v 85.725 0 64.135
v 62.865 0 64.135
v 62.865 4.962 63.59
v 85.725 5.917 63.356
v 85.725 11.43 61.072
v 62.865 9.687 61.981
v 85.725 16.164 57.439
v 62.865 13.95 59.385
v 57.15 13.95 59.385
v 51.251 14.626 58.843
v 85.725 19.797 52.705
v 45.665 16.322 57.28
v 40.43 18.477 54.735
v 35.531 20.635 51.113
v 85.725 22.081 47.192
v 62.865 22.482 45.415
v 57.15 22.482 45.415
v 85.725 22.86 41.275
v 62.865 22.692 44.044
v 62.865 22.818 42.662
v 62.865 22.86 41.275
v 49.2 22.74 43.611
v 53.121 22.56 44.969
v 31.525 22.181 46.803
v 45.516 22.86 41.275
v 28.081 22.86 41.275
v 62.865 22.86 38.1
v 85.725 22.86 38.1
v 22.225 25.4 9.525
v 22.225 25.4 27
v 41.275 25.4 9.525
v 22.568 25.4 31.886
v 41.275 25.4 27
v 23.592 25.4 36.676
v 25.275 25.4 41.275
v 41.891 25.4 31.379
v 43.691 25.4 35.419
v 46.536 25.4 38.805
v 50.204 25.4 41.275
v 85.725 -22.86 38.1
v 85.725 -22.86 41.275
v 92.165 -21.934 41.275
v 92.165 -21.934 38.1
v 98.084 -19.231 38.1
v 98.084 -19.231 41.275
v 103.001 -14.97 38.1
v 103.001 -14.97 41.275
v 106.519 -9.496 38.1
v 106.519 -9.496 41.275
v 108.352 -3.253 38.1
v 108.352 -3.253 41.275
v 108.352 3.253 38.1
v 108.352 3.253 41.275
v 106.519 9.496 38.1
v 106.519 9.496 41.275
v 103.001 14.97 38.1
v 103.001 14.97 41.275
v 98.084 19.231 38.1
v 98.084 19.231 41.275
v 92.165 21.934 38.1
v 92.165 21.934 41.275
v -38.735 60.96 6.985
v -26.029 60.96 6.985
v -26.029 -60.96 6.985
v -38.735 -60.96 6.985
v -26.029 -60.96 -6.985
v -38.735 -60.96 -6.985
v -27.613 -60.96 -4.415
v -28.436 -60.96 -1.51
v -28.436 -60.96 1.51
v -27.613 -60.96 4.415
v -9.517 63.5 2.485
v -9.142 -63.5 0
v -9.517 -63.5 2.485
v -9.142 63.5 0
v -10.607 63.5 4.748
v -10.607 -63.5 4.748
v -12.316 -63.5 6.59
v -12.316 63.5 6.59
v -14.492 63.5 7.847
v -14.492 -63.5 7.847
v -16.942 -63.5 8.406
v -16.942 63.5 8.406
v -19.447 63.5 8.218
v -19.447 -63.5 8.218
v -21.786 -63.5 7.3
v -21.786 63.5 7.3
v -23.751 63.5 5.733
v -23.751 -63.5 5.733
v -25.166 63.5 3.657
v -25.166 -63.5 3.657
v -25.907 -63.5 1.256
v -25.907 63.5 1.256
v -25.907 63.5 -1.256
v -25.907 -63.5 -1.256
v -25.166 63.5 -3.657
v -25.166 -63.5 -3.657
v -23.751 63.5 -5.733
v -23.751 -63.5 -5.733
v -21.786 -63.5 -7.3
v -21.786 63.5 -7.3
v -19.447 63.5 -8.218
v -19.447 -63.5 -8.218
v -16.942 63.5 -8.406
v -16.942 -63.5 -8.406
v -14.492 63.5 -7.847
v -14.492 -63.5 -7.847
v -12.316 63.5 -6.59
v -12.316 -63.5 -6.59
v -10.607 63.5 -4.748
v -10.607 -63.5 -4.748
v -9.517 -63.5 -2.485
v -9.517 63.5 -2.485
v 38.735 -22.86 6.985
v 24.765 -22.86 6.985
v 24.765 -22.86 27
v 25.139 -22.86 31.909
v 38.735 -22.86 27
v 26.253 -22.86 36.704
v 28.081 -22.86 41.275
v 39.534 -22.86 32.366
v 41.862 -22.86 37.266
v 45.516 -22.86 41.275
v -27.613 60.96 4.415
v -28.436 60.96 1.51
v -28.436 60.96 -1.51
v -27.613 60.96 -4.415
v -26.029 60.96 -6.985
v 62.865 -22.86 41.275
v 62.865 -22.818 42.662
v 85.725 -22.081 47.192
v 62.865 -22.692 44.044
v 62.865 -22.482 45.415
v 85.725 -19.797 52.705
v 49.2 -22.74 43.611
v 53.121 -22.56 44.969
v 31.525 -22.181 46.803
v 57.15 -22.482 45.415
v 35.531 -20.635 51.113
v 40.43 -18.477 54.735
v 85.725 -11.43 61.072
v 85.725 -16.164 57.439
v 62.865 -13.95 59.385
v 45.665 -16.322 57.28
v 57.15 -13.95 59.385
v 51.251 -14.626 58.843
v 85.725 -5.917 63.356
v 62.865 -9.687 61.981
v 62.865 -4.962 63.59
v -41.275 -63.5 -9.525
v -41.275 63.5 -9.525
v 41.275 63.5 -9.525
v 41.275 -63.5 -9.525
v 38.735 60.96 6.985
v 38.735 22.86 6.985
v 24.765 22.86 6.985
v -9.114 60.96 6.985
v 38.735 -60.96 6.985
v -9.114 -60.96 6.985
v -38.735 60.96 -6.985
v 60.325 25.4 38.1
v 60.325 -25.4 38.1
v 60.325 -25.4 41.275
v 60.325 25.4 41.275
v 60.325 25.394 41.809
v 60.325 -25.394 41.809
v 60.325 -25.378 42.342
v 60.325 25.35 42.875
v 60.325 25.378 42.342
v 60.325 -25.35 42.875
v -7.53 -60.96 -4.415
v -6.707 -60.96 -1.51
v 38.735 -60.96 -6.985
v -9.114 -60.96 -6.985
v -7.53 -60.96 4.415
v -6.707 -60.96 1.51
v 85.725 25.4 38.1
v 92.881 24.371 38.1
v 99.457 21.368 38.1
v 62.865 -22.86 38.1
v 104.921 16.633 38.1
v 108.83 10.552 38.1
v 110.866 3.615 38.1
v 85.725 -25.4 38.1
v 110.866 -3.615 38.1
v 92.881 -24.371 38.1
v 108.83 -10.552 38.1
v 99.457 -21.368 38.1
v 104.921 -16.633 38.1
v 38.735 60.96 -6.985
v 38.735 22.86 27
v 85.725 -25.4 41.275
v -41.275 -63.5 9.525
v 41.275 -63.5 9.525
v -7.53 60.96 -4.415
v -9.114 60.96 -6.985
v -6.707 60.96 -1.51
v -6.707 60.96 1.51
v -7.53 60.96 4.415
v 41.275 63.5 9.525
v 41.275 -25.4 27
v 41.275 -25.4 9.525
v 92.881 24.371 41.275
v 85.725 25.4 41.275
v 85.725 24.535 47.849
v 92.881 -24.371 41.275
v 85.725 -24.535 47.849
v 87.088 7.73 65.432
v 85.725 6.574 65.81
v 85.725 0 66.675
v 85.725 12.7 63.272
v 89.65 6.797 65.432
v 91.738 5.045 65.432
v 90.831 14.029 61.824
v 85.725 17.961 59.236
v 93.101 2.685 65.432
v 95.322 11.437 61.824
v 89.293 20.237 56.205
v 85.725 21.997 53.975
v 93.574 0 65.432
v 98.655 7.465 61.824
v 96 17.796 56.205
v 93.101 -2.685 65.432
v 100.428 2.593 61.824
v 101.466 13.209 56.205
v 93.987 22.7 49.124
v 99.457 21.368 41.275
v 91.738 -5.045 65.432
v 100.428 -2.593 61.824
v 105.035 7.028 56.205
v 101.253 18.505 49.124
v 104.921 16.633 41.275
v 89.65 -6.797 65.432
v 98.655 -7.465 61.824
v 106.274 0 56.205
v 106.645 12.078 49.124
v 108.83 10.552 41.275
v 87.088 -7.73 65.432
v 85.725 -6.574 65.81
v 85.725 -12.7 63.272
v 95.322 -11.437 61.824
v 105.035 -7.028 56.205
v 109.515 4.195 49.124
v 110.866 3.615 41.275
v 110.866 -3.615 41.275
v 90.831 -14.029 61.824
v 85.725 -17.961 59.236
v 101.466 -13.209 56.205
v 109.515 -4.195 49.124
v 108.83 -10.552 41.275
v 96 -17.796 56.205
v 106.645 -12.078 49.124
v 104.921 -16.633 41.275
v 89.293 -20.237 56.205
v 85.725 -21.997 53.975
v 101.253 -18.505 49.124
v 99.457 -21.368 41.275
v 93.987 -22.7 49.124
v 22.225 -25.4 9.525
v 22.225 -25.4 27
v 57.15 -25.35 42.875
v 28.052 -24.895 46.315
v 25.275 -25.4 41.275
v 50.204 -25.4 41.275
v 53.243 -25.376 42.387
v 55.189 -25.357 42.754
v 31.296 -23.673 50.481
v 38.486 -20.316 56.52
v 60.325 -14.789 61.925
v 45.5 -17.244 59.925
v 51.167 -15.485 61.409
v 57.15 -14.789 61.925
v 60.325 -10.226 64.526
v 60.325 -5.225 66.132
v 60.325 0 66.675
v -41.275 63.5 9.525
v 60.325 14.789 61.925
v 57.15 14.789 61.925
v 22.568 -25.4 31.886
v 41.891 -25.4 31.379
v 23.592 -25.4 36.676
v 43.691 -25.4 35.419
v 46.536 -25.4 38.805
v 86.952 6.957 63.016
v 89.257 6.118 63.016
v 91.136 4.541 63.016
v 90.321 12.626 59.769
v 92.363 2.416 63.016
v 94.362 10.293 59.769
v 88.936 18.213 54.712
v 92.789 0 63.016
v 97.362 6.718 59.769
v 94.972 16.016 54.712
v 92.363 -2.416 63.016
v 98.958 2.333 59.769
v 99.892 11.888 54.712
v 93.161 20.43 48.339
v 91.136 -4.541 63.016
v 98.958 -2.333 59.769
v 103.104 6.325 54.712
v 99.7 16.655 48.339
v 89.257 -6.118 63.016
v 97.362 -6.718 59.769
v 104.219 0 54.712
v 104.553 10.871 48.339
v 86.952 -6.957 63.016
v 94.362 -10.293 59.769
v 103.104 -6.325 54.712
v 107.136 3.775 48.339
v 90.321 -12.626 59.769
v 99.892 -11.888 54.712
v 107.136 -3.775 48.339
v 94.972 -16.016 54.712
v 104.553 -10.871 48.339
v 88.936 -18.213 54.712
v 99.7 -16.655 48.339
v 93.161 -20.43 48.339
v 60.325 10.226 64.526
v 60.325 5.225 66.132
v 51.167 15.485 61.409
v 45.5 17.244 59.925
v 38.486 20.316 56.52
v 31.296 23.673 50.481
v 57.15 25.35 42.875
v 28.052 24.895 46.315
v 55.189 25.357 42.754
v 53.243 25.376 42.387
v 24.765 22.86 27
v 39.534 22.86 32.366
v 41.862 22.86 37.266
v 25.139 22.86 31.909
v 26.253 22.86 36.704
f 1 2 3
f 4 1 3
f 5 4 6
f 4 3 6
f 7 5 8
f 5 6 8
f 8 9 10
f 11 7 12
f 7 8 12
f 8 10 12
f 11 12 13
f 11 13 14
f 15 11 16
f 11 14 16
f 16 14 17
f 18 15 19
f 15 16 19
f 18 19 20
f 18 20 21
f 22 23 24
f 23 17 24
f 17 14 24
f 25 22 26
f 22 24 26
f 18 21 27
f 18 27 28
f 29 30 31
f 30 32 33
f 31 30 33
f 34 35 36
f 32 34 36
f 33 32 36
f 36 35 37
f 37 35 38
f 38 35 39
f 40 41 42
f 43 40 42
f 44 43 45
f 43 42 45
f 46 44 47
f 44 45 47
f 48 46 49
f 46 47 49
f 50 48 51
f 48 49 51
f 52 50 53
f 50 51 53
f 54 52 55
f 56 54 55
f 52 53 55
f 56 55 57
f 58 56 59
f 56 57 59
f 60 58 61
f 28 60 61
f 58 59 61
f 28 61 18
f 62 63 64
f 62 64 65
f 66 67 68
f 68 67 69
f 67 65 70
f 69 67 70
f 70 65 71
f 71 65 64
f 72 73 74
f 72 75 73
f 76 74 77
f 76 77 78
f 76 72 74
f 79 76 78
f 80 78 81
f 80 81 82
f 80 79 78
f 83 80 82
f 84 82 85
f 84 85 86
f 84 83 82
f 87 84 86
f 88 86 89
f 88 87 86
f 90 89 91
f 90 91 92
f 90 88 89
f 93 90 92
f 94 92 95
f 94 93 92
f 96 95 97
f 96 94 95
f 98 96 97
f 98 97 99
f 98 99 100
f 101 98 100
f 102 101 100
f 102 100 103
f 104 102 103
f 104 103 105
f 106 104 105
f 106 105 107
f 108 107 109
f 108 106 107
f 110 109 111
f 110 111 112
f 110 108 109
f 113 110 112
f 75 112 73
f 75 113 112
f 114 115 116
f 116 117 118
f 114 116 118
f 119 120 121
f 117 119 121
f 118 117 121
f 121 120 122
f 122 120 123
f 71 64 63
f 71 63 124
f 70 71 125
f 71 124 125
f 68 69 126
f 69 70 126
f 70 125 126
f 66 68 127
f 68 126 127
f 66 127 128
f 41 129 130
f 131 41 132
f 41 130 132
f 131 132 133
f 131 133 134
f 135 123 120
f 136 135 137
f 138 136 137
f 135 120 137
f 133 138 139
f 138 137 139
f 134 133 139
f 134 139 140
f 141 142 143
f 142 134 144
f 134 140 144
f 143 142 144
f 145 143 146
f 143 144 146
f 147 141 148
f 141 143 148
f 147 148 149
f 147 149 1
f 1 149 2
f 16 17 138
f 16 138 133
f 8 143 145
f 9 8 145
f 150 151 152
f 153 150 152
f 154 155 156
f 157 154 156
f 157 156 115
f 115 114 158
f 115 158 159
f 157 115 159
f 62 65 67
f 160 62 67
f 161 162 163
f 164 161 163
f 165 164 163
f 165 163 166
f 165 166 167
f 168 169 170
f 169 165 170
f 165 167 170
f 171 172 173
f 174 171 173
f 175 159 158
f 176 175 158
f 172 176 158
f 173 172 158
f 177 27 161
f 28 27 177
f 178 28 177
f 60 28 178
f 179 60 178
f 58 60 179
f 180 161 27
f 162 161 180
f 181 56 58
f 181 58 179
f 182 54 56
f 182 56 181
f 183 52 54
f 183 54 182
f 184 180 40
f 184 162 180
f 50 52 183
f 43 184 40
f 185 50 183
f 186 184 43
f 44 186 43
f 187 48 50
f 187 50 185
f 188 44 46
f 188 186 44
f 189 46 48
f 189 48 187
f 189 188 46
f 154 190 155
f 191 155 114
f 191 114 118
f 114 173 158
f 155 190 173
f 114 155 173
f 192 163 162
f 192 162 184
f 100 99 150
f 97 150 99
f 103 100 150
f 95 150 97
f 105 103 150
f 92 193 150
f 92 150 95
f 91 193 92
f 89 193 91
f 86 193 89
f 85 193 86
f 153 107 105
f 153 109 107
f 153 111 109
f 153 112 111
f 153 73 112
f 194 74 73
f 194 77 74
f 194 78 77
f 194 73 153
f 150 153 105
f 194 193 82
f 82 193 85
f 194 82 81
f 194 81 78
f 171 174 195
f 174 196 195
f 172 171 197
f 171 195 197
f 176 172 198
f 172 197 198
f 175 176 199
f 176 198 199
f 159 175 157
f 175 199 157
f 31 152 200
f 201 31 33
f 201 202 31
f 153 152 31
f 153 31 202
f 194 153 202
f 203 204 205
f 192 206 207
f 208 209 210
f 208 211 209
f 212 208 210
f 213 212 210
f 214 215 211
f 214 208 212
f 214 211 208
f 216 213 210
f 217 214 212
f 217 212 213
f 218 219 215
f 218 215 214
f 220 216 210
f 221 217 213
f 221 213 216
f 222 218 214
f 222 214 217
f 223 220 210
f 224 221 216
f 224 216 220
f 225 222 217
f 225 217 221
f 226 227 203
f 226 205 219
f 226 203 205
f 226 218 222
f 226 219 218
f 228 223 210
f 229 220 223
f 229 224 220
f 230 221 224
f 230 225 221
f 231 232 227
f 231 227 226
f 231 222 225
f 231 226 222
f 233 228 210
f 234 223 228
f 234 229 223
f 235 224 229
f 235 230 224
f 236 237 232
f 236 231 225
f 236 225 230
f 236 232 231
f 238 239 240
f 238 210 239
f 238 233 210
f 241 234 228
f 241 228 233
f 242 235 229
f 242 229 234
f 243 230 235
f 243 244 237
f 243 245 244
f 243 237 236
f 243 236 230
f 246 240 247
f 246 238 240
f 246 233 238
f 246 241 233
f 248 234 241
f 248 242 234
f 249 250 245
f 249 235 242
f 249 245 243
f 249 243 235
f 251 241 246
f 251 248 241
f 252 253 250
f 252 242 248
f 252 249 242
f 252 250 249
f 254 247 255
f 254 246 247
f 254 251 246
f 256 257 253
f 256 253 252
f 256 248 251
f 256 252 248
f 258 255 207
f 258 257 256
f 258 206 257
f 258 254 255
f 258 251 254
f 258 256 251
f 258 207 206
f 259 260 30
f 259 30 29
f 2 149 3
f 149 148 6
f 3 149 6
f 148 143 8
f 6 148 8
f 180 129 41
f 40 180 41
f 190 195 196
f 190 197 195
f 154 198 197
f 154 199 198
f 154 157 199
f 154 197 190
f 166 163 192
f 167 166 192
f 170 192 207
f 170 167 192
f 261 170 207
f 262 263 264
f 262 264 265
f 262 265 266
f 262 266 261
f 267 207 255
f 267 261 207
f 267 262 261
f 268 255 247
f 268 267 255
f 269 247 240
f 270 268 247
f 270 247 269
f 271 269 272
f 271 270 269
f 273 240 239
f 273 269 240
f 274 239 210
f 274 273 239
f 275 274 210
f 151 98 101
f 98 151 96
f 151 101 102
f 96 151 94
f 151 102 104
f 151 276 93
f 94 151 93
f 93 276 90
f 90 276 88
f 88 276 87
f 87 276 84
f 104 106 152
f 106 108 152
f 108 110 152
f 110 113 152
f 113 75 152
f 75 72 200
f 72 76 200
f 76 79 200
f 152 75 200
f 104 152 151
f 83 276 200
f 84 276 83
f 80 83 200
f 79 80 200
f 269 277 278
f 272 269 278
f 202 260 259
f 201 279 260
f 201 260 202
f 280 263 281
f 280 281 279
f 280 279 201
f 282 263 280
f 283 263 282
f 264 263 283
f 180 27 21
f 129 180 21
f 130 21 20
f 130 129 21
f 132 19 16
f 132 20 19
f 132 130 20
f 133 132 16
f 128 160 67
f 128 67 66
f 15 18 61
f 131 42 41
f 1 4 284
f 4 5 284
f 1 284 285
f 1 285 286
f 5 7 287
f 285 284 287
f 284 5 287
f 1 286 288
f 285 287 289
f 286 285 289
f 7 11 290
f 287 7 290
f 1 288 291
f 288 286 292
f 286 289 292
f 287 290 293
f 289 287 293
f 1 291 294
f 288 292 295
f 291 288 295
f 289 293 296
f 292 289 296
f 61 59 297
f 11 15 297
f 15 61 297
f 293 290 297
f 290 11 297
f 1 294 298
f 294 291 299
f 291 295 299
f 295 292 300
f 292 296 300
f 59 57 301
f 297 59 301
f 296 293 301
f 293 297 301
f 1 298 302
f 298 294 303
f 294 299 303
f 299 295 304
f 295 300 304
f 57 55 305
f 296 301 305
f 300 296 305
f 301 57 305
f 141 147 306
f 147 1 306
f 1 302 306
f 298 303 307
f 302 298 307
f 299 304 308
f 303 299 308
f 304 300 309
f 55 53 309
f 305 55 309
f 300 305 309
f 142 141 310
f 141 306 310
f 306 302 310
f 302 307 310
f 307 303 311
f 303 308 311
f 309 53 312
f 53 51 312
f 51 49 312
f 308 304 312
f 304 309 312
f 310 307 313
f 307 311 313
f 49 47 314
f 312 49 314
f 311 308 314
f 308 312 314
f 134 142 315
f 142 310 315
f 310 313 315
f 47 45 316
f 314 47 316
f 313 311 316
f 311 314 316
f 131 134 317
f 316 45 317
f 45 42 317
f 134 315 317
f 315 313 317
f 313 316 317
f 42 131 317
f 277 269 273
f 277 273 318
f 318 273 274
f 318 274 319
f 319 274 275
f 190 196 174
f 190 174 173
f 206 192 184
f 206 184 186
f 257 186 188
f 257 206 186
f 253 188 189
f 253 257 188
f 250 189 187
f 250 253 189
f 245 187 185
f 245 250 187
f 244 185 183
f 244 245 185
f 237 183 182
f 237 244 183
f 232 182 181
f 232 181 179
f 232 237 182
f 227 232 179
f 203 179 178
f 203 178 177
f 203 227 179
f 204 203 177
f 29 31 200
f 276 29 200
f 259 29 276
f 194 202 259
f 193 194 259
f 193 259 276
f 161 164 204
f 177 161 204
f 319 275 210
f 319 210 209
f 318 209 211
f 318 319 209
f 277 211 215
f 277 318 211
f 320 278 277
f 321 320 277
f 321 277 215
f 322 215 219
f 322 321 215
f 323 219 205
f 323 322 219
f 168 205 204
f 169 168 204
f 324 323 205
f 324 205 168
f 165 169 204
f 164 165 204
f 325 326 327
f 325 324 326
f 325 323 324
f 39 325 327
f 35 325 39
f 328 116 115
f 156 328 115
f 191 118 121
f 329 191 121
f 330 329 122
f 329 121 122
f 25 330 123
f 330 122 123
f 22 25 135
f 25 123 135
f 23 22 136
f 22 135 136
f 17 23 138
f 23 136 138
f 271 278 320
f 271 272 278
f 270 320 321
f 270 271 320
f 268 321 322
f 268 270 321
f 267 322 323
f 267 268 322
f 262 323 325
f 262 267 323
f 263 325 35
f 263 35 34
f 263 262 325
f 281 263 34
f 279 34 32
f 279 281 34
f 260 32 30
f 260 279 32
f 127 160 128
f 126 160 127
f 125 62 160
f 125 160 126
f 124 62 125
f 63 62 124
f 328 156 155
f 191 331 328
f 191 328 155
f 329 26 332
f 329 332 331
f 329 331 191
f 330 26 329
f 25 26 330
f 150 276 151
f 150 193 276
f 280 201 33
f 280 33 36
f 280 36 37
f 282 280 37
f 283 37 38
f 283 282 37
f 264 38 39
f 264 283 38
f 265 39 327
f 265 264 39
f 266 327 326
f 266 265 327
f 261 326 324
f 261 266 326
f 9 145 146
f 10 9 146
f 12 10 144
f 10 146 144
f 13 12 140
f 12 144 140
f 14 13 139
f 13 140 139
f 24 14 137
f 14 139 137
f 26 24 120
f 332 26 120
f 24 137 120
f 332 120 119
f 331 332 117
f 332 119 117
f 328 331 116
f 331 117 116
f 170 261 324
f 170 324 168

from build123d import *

# Parameters (mm, degrees)
F0_R        = 8.4292164968
F1_DEPTH    = 63.5
F0_W        = 25.4
F0_H        = 19.05
F2_DEPTH    = 25.4
F0_H_2      = 4.7498
F0_H_3      = 4.7752
F4_DEPTH    = 25.4
F5_DEPTH    = 25.4
F6_T1_DEPTH = 88.9
F6_T4_ANGLE = 180
F7_T        = 2.54
F7_T3_DEPTH = 24.13
F7_T5_DEPTH = 55.88
F7_T7_DEPTH = 55.7790871697
F7_T9_DEPTH = 34.6589952471


# Not quite as in the source:
# - a fillet or chamfer that OpenCascade refuses, or shapes differently, is made with other operations: its cross-section is extruded or revolved along the edge and cut away or added
# - a feature of the source that left no trace in its solid (it failed there, or was rolled back) is left out
# - a shell that OpenCascade refuses in one call is made with other operations: the cavity is built on its own and cut out


with BuildPart() as f1:
    # F0 (on Front) → F1 (new body, symmetric)
    with BuildSketch(Plane.XZ):
        Polygon((-41.275, -9.525), (41.275, -9.525), (41.275, 9.525), (22.225, 9.525), (-41.275, 9.525), align=None)
        with Locations((-17.5714660436, 0)):
            Circle(F0_R, mode=Mode.SUBTRACT)
    extrude(amount=F1_DEPTH, both=True)

    # F0 (on Front) → F2 (join, symmetric)
    with BuildSketch(Plane.XZ):
        with BuildLine():
            Line((60.325, 61.9252), (57.15, 61.9252))
            ThreePointArc((57.15, 61.9252), (32.4542956671, 51.6959043329), (22.225, 27.0002))
            Line((22.225, 27.0002), (22.225, 9.525))
            Line((22.225, 9.525), (41.275, 9.525))
            Line((41.275, 9.525), (41.275, 27.0002))
            ThreePointArc((41.275, 27.0002), (45.9246798487, 38.2255201513), (57.15, 42.8752))
            Line((57.15, 42.8752), (60.325, 42.8752))
            Line((60.325, 42.8752), (60.325, 61.9252))
        make_face()
        with Locations((73.025, 52.4002)):
            Rectangle(F0_W, F0_H)
    extrude(amount=F2_DEPTH, both=True)

    # F0 (on Front) → F3 (revolve)
    with BuildSketch(Plane.XZ):
        Polygon((85.725, 66.675), (85.725, 61.9252), (85.725, 42.8752), (85.725, 38.1), (111.125, 38.1), (111.125, 66.675), align=None)
    revolve(axis=Axis((85.725, 0, 52.3875), (0, 0, 1)))

    # F0 (on Front) → F4 (join)
    with BuildSketch(Plane.XZ):
        with Locations((73.025, 64.3001)):
            Rectangle(F0_W, F0_H_2)
        with Locations((73.025, 40.4876)):
            Rectangle(F0_W, F0_H_3)
    extrude(amount=F4_DEPTH)

    # F0 (on Front) → F5 (join)
    with BuildSketch(Plane.XZ):
        with Locations((73.025, 40.4876)):
            Rectangle(F0_W, F0_H_3)
        with Locations((73.025, 64.3001)):
            Rectangle(F0_W, F0_H_2)
    extrude(amount=-F5_DEPTH)

    # F6: fillet of radius 25.4 on 3 edges, made by hand

    # F6_s2 → F6_t1 (cut)
    with BuildSketch(Plane.YZ.offset(-3.175)):
        with BuildLine():
            ThreePointArc((-25.4, 41.275), (-17.9605122421, 59.2355122421), (0, 66.675))
            Line((0, 66.675), (-25.4, 66.675))
            Line((-25.4, 66.675), (-25.4, 41.275))
        make_face()
        with BuildLine():
            ThreePointArc((0, 66.675), (17.9605122421, 59.2355122421), (25.4, 41.275))
            Line((25.4, 41.275), (25.4, 66.675))
            Line((25.4, 66.675), (0, 66.675))
        make_face()
    extrude(amount=F6_T1_DEPTH, mode=Mode.SUBTRACT)

    # F6_s3 → F6_t4 (revolve, cut)
    with BuildSketch(Plane.YZ.offset(85.725)):
        with BuildLine():
            ThreePointArc((0, 66.675), (17.9605122421, 59.2355122421), (25.4, 41.275))
            Line((25.4, 41.275), (25.4, 66.675))
            Line((25.4, 66.675), (0, 66.675))
        make_face()
    revolve(axis=Axis((85.725, 0, 66.675), (0, 0, -1)), revolution_arc=F6_T4_ANGLE, mode=Mode.SUBTRACT)

    # F7: shell of thickness 2.54, made by hand


with BuildPart() as f7_core1:
    # F7_t2: copy of F1
    add(f1.part)

    # the walls: a layer under each face that stays
    f7_faces = [f7_core1.faces().sort_by_distance(p)[0] for p in [
        (0, 0, -9.525),
        (0, 63.5, 0),
        (41.275, 0, 8.7376),
        (0, -63.5, 0),
        (-41.275, 0, 0),
        (0, 0, 9.525),
        (-26.0006825404, 0, 0),
        (36.214543408, 25.4, 25.4),
        (45.9246798487, 0, 38.2255201513),
        (36.214543408, -25.4, 25.4),
        (22.225, 0, 18.2626),
        (55.5002346295, 17.9605122421, 59.2355122421),
        (32.4542956671, 0, 51.6959043329),
        (55.5002346295, -17.9605122421, 59.2355122421),
        (58.7375, 0, 42.8752),
        (60.325, 0, 64.3001),
        (58.7375, 0, 61.9252),
        (60.325, 0, 40.4876),
        (73.025, 25.4, 39.6875),
        (103.6855122422, -1e-10, 59.2355122421),
        (73.025, -25.4, 39.6875),
        (111.125, 0, 39.6875),
    ]]
    thicken(f7_faces, amount=-F7_T, mode=Mode.SUBTRACT)

    # F7_s4 → F7_t3 (cut)
    with BuildSketch(Plane.YZ.offset(19.685)):
        Polygon((25.4254, 9.5504), (25.4, 6.985), (22.86, 6.985), (22.86, 9.525), align=None)
        Polygon((-25.4254, 9.5504), (-25.4, 6.985), (-22.86, 6.985), (-22.86, 9.525), align=None)
    extrude(amount=F7_T3_DEPTH, mode=Mode.SUBTRACT)

    # F7_s6 → F7_t5 (cut)
    with BuildSketch(Plane.XZ.offset(-27.94)):
        Polygon((22.1996, 9.5504), (22.225, 6.985), (24.765, 6.985), (24.765, 9.525), align=None)
    extrude(amount=F7_T5_DEPTH, mode=Mode.SUBTRACT)

    # F7_s8 → F7_t7 (cut)
    with BuildSketch(Plane.XZ.offset(-27.8895435848)):
        Polygon((60.2996, 42.8498), (60.325, 45.4152), (62.865, 45.4152), (62.865, 42.8752), align=None)
    extrude(amount=F7_T7_DEPTH, mode=Mode.SUBTRACT)

    # F7_s10 → F7_t9 (cut)
    with BuildSketch(Plane.XZ.offset(-17.3294976236)):
        Polygon((60.2996, 61.9506), (62.865, 61.9252), (62.865, 59.3852), (60.325, 59.3852), align=None)
    extrude(amount=F7_T9_DEPTH, mode=Mode.SUBTRACT)


with BuildPart() as f1_1:
    add(f1.part)

    # what is left inside the walls is the cavity
    f7_cavity = [f7_core1.part.solids().sort_by_distance(p)[0] for p in [
        (-28.566083, -20.32, 0),
        (14.810641, 20.32, -6.9596),
    ]]
    add(f7_cavity, mode=Mode.SUBTRACT)


solid = f1_1.part
